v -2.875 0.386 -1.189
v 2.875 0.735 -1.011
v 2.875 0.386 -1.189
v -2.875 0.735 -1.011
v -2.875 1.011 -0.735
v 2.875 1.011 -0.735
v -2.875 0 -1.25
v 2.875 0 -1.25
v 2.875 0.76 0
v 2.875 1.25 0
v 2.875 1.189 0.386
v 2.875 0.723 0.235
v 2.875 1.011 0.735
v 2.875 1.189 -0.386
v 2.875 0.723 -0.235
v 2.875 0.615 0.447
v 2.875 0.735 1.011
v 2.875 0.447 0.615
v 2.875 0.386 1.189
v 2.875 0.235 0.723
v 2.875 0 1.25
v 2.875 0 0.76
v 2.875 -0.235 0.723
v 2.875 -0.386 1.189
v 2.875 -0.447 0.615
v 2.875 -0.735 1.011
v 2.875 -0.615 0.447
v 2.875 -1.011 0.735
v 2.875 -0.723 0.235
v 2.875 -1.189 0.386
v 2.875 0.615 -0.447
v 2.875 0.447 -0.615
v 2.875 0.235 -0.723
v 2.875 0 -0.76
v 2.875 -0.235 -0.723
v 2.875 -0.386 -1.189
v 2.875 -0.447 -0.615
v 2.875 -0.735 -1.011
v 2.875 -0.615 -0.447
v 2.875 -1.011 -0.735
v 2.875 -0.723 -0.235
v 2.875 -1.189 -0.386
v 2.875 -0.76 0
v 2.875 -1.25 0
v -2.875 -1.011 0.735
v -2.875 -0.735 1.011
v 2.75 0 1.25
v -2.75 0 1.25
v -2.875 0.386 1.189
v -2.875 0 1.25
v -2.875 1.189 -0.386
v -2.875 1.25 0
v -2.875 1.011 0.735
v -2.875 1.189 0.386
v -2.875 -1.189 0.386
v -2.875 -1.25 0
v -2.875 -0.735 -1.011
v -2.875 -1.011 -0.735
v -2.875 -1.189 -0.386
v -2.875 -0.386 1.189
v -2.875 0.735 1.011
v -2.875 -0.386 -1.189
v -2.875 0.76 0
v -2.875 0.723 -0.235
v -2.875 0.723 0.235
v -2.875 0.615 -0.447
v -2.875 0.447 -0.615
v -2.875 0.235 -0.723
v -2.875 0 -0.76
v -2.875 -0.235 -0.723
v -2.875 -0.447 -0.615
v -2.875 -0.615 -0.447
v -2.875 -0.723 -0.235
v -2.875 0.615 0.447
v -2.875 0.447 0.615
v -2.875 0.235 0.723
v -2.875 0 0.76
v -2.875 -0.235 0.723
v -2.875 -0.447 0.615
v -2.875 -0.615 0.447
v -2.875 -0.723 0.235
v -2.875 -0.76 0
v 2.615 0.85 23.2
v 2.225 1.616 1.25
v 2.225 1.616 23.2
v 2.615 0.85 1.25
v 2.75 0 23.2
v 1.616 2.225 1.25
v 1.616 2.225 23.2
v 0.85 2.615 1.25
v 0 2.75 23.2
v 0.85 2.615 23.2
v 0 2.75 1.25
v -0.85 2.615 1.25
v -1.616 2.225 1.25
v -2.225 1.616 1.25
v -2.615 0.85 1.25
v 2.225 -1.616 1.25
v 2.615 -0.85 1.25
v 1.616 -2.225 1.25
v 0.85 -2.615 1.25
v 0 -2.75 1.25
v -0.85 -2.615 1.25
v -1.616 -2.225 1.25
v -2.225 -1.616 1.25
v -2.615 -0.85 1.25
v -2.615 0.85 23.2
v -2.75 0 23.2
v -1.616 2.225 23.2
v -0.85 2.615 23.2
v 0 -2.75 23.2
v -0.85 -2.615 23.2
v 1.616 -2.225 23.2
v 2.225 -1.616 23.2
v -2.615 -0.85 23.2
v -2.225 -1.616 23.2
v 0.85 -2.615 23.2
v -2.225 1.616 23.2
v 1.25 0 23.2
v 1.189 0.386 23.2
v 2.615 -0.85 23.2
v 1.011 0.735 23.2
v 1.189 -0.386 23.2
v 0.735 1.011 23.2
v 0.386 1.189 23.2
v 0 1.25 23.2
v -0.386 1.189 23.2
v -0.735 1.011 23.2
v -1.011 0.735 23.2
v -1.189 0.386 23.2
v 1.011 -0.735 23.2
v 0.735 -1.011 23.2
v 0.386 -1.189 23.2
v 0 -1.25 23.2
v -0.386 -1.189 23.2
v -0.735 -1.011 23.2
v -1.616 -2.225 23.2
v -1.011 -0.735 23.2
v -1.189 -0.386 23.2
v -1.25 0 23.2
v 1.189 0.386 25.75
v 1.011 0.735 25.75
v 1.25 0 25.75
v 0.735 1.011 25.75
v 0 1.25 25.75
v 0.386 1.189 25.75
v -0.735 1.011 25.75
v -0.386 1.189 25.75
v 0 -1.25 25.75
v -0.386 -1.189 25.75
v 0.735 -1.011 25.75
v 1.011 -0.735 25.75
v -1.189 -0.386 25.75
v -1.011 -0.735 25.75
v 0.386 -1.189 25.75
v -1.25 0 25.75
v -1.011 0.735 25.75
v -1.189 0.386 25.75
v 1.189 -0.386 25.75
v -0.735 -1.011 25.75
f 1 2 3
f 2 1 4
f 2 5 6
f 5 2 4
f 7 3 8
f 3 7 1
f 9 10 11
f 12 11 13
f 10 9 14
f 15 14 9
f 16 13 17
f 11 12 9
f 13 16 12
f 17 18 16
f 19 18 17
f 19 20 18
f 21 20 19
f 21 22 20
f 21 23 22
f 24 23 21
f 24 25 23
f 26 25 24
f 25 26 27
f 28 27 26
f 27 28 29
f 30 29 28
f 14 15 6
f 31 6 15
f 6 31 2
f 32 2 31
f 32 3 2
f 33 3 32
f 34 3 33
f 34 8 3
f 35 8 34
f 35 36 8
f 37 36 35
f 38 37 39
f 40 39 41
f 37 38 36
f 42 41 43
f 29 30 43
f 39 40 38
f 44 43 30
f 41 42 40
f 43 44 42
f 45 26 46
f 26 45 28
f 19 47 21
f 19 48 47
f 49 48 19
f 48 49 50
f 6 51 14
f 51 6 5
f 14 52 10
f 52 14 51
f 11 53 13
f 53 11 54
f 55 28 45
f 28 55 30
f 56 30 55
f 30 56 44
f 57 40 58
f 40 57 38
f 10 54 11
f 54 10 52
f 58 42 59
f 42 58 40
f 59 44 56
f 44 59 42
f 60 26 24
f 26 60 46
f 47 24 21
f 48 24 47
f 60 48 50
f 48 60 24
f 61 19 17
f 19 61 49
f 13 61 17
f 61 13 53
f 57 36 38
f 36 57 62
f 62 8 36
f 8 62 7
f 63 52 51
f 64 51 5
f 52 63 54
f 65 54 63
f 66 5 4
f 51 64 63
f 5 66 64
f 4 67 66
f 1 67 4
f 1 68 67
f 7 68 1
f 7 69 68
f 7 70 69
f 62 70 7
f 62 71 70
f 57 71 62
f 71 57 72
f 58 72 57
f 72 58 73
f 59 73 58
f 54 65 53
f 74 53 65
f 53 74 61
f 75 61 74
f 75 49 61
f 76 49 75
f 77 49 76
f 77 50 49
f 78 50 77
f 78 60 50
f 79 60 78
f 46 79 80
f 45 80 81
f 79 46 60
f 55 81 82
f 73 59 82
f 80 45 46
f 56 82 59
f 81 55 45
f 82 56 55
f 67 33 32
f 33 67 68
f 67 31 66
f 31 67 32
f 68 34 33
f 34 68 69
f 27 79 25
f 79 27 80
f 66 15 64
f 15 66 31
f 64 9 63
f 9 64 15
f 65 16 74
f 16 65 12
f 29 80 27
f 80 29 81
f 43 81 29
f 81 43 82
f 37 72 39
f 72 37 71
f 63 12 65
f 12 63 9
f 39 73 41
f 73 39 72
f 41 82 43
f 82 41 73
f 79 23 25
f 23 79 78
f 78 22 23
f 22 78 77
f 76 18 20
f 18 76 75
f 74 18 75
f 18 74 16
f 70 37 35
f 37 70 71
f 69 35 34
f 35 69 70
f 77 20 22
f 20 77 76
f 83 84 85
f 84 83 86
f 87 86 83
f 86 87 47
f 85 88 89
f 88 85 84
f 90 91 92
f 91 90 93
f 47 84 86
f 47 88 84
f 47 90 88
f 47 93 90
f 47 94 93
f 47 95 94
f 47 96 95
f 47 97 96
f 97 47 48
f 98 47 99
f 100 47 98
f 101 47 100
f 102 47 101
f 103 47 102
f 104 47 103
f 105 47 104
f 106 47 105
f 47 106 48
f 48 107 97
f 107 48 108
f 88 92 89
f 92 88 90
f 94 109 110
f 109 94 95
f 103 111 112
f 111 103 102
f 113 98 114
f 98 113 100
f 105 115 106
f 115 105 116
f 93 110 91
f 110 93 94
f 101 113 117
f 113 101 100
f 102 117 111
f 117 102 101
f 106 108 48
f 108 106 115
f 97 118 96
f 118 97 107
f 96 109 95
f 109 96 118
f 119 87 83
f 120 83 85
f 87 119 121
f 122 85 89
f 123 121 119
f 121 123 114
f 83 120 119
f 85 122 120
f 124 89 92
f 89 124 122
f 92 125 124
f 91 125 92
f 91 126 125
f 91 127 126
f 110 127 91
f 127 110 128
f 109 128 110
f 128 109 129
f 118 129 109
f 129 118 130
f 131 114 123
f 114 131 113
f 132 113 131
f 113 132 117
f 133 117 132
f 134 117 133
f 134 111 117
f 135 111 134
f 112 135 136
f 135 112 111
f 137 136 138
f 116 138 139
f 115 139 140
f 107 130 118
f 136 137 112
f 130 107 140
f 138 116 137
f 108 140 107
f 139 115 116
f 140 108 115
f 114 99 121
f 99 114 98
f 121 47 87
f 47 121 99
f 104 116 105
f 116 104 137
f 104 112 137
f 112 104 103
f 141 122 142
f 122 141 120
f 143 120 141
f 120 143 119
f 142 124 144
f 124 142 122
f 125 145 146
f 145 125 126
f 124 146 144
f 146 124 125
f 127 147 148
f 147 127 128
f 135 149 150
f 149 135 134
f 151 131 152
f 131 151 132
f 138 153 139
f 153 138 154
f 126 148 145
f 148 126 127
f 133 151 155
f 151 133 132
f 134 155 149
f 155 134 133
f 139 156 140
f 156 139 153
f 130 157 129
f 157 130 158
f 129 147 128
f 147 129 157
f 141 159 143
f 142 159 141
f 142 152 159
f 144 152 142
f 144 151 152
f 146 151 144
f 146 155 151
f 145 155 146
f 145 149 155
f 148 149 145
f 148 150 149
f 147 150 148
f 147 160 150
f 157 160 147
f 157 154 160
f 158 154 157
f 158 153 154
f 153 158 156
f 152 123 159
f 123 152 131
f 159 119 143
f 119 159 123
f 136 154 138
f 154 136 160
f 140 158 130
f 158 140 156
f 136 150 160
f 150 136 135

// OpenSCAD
$fn=20;

cylMainBore = 5;
cylMainStroke = 16;
cylMainExt = 43;
cylMainRet = 27;
cylMainA = (cylMainRet-cylMainStroke); //center to center minus stroke length
cylMainB = 0.25; // cylinder wall thickness
cylMainD = 2.5; //Rod OD
cylMainE = 5.75; //rear pin holder width
cylMainG = 4; //rod pin holder width
cylMainJ = 3.8; //distance from the end of the cylinder body to rod pin center
cylMainR = 1.52; //pin hole ID
cylMainS = 2.5; //pin holder OD

cylMain(0); //rodend pin holder: 1 = yes, 0 = no

echo(cylMainRet-cylMainJ-(cylMainS/2));

module cylMain(PinYN){

MAINcylinder();
translate([0,0,cylMainRet])  //to animate include "+($t*(cylMainStroke))"
MAINcylinderROD(PinYN);  //rodend pin holder: 1 = yes, 0 = no
}

module MAINcylinder(){
    difference(){
    translate([-cylMainE/2,0,0])
rotate([0,90,0])
cylinder(h = cylMainE, r = cylMainS/2);
    
    translate([-cylMainE/2,0,0])
rotate([0,90,0])
cylinder(h = cylMainE, r = cylMainR/2);
    } //end difference
    
    translate([0,0,(cylMainS/2)])
    cylinder(h = (cylMainRet-cylMainJ-(cylMainS/2)), r = (cylMainBore/2)+cylMainB);
    
}// end Main Cylinder module

module MAINcylinderROD(PinYN){
difference(){
            
    translate([-cylMainG/2,0,0])
rotate([0,90,0])
cylinder(h = PinYN*(cylMainG), r = PinYN*(cylMainS/2));
    
    translate([-cylMainG/2,0,0])
rotate([0,90,0])
cylinder(h = cylMainG, r = cylMainR/2);

    } //end difference
                translate([0,0,-(cylMainStroke+cylMainJ-(cylMainS/2))-(cylMainS/2)])
            cylinder(h = cylMainStroke+cylMainJ-(cylMainS/2), r = cylMainD/2);
    
}
